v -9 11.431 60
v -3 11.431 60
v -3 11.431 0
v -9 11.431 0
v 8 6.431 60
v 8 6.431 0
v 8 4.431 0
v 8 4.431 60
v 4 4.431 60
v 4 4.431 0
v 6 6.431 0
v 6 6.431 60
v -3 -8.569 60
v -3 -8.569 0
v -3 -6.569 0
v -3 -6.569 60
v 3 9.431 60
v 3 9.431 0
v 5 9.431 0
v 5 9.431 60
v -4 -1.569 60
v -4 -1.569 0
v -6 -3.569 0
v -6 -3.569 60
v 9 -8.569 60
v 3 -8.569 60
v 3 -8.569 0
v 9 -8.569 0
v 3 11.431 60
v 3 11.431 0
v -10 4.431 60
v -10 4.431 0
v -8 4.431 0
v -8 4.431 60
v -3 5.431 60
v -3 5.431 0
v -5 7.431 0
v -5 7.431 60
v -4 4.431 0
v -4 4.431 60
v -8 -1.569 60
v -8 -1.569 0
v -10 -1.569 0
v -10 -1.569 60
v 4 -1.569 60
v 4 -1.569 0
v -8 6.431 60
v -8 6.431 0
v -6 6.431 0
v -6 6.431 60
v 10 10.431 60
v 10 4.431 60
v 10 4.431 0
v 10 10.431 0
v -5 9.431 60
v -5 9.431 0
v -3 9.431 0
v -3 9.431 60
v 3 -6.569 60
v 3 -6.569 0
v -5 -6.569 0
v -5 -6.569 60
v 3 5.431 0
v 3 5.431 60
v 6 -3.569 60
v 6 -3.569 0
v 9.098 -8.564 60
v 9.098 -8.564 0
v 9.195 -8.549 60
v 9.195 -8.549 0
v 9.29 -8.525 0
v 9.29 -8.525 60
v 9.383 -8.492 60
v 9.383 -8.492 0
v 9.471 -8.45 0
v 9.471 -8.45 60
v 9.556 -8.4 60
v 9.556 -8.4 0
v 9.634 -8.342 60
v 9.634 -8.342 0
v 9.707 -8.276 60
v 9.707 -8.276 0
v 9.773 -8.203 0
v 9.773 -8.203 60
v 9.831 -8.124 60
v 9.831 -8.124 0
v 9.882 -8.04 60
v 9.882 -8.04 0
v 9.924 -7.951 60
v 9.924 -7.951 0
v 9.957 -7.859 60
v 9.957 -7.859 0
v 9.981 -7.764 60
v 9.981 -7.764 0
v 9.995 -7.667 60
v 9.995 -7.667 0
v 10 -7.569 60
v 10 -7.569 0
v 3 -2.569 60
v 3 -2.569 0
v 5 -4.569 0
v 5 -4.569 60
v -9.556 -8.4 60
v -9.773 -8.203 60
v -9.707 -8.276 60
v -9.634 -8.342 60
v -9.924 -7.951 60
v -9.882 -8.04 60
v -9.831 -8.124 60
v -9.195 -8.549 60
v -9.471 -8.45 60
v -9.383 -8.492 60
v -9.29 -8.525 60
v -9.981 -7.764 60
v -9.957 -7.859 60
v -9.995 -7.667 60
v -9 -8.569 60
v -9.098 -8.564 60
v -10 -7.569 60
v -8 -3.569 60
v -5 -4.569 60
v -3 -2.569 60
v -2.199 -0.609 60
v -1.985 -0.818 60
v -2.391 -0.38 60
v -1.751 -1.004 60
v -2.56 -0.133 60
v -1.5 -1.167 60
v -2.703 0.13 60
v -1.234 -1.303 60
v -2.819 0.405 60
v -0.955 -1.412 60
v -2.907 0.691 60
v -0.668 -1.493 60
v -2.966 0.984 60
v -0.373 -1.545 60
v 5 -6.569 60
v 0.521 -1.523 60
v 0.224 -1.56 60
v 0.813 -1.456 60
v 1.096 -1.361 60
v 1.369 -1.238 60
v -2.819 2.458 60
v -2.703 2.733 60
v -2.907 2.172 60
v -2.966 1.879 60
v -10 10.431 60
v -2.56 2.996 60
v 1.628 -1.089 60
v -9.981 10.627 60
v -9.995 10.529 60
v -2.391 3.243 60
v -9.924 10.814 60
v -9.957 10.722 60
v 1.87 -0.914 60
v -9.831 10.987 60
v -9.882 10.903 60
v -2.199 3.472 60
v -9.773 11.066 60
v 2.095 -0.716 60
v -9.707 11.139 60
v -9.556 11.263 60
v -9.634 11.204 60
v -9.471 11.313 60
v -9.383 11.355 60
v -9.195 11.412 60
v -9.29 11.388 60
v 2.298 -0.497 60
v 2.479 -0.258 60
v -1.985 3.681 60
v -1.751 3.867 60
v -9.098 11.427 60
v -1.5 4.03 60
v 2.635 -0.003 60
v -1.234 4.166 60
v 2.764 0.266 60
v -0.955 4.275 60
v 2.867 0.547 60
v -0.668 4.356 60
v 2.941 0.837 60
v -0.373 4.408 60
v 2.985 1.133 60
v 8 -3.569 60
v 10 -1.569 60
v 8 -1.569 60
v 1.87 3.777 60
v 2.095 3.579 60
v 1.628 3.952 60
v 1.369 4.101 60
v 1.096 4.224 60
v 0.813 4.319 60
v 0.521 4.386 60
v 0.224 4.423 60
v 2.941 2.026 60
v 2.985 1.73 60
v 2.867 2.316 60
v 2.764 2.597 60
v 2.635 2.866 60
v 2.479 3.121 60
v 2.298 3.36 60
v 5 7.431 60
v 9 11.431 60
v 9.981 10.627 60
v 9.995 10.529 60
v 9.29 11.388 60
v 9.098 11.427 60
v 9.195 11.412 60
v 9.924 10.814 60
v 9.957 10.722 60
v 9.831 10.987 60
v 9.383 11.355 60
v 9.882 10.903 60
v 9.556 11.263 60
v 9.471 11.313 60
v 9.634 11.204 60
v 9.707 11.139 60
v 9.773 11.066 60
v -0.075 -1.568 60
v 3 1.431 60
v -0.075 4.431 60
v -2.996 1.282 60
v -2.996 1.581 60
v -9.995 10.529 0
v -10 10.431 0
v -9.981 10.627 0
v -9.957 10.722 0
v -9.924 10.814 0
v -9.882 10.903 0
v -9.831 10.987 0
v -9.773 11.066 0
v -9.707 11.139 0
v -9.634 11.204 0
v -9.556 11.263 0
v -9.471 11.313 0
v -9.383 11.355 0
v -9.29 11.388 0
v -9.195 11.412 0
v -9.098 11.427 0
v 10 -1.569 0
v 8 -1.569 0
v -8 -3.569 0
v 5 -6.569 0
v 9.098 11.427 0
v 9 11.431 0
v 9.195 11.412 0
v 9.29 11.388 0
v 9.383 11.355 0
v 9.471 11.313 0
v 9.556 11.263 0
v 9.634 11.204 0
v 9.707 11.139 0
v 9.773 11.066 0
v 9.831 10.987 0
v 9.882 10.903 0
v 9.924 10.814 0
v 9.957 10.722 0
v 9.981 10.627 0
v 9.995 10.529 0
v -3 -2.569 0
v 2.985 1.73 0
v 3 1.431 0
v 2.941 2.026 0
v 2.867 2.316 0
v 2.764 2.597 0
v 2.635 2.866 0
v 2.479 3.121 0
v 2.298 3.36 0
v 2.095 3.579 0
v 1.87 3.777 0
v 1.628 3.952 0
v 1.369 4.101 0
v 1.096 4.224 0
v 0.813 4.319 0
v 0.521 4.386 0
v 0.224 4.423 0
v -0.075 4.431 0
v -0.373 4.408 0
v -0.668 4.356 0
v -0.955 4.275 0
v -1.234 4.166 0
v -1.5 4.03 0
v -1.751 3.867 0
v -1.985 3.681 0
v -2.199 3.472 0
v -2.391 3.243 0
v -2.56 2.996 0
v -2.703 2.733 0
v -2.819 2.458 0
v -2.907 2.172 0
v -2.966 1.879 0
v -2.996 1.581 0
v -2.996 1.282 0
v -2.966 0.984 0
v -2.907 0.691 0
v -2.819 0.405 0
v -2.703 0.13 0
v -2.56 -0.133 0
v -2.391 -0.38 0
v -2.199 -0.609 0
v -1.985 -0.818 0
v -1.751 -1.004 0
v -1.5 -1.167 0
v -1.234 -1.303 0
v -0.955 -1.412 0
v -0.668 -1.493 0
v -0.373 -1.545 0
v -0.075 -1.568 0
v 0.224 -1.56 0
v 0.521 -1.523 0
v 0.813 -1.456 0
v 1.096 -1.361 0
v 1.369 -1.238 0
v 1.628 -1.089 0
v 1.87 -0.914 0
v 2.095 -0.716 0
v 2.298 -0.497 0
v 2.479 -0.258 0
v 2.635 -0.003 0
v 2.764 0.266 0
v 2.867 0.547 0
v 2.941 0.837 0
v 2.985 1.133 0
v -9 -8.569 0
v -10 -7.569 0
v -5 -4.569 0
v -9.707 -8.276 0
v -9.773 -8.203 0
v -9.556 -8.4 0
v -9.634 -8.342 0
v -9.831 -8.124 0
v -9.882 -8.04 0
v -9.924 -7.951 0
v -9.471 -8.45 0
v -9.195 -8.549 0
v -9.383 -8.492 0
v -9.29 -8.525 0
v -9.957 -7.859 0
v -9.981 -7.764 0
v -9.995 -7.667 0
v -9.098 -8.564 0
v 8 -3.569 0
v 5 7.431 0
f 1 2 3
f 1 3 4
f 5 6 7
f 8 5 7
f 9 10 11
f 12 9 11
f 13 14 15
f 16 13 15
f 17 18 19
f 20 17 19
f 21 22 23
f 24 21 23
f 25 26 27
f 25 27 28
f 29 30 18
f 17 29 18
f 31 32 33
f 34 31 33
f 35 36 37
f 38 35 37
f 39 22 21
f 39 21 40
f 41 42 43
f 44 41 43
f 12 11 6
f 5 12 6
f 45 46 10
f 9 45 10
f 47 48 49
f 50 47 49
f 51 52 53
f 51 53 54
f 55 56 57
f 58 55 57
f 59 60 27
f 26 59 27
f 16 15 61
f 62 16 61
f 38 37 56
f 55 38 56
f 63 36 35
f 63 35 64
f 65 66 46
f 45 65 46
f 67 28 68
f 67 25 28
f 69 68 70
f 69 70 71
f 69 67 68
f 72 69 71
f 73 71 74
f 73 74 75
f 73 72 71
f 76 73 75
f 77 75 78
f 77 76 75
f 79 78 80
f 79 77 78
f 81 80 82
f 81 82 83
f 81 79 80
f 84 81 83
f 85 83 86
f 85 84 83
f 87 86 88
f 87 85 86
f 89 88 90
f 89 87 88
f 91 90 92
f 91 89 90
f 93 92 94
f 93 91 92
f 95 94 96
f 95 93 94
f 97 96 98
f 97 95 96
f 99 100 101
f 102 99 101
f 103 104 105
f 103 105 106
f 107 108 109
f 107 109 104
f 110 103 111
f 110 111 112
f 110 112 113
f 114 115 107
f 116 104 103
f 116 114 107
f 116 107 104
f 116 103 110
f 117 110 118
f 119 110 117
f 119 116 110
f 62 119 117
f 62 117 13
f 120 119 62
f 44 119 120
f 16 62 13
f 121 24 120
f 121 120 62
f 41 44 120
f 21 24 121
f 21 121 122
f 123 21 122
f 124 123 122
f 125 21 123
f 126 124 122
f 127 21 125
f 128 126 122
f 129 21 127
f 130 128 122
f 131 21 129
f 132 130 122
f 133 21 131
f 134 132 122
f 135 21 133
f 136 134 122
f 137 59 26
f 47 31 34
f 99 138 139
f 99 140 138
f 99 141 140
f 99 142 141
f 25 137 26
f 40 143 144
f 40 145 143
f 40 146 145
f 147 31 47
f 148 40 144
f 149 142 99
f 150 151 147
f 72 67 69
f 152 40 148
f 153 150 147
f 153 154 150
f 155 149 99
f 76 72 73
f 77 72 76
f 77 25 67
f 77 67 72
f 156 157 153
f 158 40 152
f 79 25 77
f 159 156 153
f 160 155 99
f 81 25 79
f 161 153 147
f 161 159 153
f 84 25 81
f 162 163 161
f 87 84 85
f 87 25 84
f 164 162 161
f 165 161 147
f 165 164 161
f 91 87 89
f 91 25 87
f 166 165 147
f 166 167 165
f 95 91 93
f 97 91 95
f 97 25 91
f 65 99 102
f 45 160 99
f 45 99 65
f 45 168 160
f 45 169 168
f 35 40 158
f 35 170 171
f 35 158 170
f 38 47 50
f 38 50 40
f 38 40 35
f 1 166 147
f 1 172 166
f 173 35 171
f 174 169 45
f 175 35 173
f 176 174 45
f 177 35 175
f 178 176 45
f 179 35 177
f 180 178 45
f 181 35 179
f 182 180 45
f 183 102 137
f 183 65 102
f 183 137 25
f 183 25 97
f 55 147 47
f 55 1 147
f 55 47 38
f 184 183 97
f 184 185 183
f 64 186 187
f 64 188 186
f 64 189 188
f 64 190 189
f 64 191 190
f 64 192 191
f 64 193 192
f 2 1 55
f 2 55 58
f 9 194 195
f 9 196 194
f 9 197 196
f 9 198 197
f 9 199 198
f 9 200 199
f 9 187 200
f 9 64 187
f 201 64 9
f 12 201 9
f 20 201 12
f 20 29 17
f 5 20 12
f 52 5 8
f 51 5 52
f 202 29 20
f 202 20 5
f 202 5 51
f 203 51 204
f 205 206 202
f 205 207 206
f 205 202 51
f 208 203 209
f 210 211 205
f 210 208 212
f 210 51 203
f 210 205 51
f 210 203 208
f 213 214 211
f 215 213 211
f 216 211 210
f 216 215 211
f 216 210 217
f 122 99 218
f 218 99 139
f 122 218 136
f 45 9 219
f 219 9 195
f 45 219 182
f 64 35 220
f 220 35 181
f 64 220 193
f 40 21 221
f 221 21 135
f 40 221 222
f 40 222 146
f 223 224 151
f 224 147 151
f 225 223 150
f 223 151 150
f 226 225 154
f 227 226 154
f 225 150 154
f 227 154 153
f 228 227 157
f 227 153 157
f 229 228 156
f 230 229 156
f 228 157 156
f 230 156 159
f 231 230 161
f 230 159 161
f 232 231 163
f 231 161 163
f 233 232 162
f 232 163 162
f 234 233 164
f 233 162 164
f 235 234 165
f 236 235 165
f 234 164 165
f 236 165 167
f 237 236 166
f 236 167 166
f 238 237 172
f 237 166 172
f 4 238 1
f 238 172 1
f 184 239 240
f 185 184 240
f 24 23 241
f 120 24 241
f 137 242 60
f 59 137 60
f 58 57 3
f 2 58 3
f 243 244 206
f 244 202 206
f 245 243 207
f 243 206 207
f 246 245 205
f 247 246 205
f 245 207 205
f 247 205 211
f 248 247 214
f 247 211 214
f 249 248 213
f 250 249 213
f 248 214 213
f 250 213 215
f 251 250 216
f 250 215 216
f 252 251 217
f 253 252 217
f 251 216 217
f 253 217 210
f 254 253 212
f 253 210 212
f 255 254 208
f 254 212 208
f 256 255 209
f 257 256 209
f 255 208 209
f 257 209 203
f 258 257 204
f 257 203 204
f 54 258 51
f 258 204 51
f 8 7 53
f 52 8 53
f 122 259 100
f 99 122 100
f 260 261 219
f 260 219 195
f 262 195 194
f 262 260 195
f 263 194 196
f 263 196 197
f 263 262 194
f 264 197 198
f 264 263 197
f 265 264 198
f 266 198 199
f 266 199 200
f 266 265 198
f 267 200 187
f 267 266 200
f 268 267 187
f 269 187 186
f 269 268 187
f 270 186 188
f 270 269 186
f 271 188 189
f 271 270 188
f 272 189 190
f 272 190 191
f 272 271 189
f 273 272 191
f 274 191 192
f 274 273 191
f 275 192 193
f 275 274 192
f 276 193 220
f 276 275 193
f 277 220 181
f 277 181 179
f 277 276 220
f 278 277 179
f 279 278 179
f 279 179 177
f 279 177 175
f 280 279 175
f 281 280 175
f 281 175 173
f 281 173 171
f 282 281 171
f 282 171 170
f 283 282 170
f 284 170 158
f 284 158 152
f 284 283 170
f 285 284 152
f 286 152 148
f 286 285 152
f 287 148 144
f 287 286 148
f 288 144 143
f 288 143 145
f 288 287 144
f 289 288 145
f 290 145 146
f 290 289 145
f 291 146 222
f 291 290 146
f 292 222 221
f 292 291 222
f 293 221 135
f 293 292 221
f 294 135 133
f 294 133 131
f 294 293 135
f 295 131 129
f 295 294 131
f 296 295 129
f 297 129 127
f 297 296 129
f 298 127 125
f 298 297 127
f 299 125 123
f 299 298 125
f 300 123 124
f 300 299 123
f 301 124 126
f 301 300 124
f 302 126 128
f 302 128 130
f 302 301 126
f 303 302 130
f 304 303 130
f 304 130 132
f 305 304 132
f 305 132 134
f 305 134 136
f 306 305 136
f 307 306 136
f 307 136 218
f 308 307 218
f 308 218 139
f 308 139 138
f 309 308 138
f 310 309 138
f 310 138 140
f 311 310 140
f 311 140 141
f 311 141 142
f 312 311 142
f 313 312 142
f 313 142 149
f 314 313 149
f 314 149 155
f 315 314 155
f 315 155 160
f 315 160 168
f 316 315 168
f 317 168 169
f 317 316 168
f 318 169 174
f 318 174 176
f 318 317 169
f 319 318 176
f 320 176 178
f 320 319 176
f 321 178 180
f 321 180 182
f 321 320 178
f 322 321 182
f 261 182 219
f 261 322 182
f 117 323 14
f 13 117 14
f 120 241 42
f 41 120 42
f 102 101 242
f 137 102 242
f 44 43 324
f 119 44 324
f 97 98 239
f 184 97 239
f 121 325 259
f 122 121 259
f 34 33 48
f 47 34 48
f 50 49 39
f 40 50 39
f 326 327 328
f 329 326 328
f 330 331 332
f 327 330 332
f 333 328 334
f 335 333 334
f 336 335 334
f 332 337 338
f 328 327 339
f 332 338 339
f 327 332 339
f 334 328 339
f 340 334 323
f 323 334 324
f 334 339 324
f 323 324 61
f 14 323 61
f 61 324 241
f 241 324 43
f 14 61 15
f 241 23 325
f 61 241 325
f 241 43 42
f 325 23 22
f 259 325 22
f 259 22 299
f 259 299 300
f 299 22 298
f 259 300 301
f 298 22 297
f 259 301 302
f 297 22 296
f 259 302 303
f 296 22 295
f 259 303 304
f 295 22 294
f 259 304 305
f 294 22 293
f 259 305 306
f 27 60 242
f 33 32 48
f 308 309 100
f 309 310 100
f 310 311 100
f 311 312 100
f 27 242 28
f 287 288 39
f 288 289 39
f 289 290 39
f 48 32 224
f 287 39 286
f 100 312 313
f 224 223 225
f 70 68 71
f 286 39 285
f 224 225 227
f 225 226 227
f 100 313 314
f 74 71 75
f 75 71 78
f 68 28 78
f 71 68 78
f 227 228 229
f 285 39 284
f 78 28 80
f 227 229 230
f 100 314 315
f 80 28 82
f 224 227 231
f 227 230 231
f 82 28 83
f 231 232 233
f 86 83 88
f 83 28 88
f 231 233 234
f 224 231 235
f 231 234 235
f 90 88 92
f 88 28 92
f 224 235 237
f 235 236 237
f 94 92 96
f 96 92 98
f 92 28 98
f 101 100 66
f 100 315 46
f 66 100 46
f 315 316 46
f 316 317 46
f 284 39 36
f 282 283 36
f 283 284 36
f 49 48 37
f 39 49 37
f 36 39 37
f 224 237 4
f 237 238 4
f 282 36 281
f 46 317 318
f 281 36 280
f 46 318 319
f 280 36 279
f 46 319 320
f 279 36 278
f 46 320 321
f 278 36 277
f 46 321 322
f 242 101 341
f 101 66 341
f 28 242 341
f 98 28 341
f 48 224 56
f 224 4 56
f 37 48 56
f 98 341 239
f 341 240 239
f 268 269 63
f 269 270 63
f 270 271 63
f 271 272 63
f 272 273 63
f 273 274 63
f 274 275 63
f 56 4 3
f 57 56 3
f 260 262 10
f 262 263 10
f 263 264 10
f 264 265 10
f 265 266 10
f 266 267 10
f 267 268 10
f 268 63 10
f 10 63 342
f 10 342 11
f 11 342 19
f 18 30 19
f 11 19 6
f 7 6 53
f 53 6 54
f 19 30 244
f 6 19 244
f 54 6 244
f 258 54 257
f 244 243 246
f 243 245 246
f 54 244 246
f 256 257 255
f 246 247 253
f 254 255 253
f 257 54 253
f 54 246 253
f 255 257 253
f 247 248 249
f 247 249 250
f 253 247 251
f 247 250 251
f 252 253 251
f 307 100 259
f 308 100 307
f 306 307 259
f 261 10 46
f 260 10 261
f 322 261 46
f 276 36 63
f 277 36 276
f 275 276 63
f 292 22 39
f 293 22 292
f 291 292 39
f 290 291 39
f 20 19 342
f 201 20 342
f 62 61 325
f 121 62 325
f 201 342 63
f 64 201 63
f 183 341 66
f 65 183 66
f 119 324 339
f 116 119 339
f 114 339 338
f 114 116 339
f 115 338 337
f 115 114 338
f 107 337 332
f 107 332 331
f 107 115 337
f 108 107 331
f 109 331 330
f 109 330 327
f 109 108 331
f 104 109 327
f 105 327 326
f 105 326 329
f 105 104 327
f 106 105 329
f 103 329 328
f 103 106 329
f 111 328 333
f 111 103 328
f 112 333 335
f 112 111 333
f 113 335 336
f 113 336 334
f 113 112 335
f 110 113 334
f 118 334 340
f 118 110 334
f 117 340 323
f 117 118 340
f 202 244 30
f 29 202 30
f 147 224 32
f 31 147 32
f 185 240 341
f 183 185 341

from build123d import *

# Parameters (mm, degrees)
SKETCH_1_W      = 8
SKETCH_1_H      = 8
SKETCH_1_R      = 3
EXTRUDE_1_DEPTH = 60
FILLET_2_R      = 1


with BuildPart() as part:
    # 草图1 → 凸台-拉伸1 (new body)
    # profile 1 of 6: a face of its own
    with BuildSketch(Plane.XY):
        Polygon((10, 11.431478203), (3, 11.431478203), (3, 9.431478203), (5, 9.431478203), (5, 7.431478203), (3, 5.431478203), (4, 5.431478203), (4, 4.431478203), (6, 6.431478203), (8, 6.431478203), (8, 4.431478203), (10, 4.431478203), align=None)
    # profile 2 of 6: a face of its own
    with BuildSketch(Plane.XY):
        Polygon((3, -6.568521797), (3, -8.568521797), (10, -8.568521797), (10, -1.568521797), (8, -1.568521797), (8, -3.568521797), (6, -3.568521797), (4, -1.568521797), (4, -2.568521797), (3, -2.568521797), (5, -4.568521797), (5, -6.568521797), align=None)
    # profile 3 of 6: a face of its own
    with BuildSketch(Plane.XY):
        Polygon((-8, -1.568521797), (-10, -1.568521797), (-10, -8.568521797), (-3, -8.568521797), (-3, -6.568521797), (-5, -6.568521797), (-5, -4.568521797), (-3, -2.568521797), (-4, -2.568521797), (-4, -1.568521797), (-6, -3.568521797), (-8, -3.568521797), align=None)
    # profile 4 of 6: a face of its own
    with BuildSketch(Plane.XY):
        Polygon((-3, 11.431478203), (-10, 11.431478203), (-4, 5.431478203), (-3, 5.431478203), (-5, 7.431478203), (-5, 9.431478203), (-3, 9.431478203), align=None)
    # profile 5 of 6: a face of its own
    with BuildSketch(Plane.XY):
        Polygon((-10, 11.431478203), (-10, 4.431478203), (-8, 4.431478203), (-8, 6.431478203), (-6, 6.431478203), (-4, 4.431478203), (-4, 5.431478203), align=None)
    # profile 6 of 6: a face of its own
    with BuildSketch(Plane.XY):
        with Locations((0, 1.431478203)):
            Rectangle(SKETCH_1_W, SKETCH_1_H)
        with Locations((0, 1.431478203)):
            Circle(SKETCH_1_R, mode=Mode.SUBTRACT)
    extrude(amount=EXTRUDE_1_DEPTH)

    # 圆角2
    fillet_2_edges = [part.edges().sort_by_distance(p)[0] for p in [
        (10, 11.431478203, 30),
        (10, -8.568521797, 30),
        (-10, -8.568521797, 30),
        (-10, 11.431478203, 30),
    ]]
    fillet(fillet_2_edges, radius=FILLET_2_R)


solid = part.part
